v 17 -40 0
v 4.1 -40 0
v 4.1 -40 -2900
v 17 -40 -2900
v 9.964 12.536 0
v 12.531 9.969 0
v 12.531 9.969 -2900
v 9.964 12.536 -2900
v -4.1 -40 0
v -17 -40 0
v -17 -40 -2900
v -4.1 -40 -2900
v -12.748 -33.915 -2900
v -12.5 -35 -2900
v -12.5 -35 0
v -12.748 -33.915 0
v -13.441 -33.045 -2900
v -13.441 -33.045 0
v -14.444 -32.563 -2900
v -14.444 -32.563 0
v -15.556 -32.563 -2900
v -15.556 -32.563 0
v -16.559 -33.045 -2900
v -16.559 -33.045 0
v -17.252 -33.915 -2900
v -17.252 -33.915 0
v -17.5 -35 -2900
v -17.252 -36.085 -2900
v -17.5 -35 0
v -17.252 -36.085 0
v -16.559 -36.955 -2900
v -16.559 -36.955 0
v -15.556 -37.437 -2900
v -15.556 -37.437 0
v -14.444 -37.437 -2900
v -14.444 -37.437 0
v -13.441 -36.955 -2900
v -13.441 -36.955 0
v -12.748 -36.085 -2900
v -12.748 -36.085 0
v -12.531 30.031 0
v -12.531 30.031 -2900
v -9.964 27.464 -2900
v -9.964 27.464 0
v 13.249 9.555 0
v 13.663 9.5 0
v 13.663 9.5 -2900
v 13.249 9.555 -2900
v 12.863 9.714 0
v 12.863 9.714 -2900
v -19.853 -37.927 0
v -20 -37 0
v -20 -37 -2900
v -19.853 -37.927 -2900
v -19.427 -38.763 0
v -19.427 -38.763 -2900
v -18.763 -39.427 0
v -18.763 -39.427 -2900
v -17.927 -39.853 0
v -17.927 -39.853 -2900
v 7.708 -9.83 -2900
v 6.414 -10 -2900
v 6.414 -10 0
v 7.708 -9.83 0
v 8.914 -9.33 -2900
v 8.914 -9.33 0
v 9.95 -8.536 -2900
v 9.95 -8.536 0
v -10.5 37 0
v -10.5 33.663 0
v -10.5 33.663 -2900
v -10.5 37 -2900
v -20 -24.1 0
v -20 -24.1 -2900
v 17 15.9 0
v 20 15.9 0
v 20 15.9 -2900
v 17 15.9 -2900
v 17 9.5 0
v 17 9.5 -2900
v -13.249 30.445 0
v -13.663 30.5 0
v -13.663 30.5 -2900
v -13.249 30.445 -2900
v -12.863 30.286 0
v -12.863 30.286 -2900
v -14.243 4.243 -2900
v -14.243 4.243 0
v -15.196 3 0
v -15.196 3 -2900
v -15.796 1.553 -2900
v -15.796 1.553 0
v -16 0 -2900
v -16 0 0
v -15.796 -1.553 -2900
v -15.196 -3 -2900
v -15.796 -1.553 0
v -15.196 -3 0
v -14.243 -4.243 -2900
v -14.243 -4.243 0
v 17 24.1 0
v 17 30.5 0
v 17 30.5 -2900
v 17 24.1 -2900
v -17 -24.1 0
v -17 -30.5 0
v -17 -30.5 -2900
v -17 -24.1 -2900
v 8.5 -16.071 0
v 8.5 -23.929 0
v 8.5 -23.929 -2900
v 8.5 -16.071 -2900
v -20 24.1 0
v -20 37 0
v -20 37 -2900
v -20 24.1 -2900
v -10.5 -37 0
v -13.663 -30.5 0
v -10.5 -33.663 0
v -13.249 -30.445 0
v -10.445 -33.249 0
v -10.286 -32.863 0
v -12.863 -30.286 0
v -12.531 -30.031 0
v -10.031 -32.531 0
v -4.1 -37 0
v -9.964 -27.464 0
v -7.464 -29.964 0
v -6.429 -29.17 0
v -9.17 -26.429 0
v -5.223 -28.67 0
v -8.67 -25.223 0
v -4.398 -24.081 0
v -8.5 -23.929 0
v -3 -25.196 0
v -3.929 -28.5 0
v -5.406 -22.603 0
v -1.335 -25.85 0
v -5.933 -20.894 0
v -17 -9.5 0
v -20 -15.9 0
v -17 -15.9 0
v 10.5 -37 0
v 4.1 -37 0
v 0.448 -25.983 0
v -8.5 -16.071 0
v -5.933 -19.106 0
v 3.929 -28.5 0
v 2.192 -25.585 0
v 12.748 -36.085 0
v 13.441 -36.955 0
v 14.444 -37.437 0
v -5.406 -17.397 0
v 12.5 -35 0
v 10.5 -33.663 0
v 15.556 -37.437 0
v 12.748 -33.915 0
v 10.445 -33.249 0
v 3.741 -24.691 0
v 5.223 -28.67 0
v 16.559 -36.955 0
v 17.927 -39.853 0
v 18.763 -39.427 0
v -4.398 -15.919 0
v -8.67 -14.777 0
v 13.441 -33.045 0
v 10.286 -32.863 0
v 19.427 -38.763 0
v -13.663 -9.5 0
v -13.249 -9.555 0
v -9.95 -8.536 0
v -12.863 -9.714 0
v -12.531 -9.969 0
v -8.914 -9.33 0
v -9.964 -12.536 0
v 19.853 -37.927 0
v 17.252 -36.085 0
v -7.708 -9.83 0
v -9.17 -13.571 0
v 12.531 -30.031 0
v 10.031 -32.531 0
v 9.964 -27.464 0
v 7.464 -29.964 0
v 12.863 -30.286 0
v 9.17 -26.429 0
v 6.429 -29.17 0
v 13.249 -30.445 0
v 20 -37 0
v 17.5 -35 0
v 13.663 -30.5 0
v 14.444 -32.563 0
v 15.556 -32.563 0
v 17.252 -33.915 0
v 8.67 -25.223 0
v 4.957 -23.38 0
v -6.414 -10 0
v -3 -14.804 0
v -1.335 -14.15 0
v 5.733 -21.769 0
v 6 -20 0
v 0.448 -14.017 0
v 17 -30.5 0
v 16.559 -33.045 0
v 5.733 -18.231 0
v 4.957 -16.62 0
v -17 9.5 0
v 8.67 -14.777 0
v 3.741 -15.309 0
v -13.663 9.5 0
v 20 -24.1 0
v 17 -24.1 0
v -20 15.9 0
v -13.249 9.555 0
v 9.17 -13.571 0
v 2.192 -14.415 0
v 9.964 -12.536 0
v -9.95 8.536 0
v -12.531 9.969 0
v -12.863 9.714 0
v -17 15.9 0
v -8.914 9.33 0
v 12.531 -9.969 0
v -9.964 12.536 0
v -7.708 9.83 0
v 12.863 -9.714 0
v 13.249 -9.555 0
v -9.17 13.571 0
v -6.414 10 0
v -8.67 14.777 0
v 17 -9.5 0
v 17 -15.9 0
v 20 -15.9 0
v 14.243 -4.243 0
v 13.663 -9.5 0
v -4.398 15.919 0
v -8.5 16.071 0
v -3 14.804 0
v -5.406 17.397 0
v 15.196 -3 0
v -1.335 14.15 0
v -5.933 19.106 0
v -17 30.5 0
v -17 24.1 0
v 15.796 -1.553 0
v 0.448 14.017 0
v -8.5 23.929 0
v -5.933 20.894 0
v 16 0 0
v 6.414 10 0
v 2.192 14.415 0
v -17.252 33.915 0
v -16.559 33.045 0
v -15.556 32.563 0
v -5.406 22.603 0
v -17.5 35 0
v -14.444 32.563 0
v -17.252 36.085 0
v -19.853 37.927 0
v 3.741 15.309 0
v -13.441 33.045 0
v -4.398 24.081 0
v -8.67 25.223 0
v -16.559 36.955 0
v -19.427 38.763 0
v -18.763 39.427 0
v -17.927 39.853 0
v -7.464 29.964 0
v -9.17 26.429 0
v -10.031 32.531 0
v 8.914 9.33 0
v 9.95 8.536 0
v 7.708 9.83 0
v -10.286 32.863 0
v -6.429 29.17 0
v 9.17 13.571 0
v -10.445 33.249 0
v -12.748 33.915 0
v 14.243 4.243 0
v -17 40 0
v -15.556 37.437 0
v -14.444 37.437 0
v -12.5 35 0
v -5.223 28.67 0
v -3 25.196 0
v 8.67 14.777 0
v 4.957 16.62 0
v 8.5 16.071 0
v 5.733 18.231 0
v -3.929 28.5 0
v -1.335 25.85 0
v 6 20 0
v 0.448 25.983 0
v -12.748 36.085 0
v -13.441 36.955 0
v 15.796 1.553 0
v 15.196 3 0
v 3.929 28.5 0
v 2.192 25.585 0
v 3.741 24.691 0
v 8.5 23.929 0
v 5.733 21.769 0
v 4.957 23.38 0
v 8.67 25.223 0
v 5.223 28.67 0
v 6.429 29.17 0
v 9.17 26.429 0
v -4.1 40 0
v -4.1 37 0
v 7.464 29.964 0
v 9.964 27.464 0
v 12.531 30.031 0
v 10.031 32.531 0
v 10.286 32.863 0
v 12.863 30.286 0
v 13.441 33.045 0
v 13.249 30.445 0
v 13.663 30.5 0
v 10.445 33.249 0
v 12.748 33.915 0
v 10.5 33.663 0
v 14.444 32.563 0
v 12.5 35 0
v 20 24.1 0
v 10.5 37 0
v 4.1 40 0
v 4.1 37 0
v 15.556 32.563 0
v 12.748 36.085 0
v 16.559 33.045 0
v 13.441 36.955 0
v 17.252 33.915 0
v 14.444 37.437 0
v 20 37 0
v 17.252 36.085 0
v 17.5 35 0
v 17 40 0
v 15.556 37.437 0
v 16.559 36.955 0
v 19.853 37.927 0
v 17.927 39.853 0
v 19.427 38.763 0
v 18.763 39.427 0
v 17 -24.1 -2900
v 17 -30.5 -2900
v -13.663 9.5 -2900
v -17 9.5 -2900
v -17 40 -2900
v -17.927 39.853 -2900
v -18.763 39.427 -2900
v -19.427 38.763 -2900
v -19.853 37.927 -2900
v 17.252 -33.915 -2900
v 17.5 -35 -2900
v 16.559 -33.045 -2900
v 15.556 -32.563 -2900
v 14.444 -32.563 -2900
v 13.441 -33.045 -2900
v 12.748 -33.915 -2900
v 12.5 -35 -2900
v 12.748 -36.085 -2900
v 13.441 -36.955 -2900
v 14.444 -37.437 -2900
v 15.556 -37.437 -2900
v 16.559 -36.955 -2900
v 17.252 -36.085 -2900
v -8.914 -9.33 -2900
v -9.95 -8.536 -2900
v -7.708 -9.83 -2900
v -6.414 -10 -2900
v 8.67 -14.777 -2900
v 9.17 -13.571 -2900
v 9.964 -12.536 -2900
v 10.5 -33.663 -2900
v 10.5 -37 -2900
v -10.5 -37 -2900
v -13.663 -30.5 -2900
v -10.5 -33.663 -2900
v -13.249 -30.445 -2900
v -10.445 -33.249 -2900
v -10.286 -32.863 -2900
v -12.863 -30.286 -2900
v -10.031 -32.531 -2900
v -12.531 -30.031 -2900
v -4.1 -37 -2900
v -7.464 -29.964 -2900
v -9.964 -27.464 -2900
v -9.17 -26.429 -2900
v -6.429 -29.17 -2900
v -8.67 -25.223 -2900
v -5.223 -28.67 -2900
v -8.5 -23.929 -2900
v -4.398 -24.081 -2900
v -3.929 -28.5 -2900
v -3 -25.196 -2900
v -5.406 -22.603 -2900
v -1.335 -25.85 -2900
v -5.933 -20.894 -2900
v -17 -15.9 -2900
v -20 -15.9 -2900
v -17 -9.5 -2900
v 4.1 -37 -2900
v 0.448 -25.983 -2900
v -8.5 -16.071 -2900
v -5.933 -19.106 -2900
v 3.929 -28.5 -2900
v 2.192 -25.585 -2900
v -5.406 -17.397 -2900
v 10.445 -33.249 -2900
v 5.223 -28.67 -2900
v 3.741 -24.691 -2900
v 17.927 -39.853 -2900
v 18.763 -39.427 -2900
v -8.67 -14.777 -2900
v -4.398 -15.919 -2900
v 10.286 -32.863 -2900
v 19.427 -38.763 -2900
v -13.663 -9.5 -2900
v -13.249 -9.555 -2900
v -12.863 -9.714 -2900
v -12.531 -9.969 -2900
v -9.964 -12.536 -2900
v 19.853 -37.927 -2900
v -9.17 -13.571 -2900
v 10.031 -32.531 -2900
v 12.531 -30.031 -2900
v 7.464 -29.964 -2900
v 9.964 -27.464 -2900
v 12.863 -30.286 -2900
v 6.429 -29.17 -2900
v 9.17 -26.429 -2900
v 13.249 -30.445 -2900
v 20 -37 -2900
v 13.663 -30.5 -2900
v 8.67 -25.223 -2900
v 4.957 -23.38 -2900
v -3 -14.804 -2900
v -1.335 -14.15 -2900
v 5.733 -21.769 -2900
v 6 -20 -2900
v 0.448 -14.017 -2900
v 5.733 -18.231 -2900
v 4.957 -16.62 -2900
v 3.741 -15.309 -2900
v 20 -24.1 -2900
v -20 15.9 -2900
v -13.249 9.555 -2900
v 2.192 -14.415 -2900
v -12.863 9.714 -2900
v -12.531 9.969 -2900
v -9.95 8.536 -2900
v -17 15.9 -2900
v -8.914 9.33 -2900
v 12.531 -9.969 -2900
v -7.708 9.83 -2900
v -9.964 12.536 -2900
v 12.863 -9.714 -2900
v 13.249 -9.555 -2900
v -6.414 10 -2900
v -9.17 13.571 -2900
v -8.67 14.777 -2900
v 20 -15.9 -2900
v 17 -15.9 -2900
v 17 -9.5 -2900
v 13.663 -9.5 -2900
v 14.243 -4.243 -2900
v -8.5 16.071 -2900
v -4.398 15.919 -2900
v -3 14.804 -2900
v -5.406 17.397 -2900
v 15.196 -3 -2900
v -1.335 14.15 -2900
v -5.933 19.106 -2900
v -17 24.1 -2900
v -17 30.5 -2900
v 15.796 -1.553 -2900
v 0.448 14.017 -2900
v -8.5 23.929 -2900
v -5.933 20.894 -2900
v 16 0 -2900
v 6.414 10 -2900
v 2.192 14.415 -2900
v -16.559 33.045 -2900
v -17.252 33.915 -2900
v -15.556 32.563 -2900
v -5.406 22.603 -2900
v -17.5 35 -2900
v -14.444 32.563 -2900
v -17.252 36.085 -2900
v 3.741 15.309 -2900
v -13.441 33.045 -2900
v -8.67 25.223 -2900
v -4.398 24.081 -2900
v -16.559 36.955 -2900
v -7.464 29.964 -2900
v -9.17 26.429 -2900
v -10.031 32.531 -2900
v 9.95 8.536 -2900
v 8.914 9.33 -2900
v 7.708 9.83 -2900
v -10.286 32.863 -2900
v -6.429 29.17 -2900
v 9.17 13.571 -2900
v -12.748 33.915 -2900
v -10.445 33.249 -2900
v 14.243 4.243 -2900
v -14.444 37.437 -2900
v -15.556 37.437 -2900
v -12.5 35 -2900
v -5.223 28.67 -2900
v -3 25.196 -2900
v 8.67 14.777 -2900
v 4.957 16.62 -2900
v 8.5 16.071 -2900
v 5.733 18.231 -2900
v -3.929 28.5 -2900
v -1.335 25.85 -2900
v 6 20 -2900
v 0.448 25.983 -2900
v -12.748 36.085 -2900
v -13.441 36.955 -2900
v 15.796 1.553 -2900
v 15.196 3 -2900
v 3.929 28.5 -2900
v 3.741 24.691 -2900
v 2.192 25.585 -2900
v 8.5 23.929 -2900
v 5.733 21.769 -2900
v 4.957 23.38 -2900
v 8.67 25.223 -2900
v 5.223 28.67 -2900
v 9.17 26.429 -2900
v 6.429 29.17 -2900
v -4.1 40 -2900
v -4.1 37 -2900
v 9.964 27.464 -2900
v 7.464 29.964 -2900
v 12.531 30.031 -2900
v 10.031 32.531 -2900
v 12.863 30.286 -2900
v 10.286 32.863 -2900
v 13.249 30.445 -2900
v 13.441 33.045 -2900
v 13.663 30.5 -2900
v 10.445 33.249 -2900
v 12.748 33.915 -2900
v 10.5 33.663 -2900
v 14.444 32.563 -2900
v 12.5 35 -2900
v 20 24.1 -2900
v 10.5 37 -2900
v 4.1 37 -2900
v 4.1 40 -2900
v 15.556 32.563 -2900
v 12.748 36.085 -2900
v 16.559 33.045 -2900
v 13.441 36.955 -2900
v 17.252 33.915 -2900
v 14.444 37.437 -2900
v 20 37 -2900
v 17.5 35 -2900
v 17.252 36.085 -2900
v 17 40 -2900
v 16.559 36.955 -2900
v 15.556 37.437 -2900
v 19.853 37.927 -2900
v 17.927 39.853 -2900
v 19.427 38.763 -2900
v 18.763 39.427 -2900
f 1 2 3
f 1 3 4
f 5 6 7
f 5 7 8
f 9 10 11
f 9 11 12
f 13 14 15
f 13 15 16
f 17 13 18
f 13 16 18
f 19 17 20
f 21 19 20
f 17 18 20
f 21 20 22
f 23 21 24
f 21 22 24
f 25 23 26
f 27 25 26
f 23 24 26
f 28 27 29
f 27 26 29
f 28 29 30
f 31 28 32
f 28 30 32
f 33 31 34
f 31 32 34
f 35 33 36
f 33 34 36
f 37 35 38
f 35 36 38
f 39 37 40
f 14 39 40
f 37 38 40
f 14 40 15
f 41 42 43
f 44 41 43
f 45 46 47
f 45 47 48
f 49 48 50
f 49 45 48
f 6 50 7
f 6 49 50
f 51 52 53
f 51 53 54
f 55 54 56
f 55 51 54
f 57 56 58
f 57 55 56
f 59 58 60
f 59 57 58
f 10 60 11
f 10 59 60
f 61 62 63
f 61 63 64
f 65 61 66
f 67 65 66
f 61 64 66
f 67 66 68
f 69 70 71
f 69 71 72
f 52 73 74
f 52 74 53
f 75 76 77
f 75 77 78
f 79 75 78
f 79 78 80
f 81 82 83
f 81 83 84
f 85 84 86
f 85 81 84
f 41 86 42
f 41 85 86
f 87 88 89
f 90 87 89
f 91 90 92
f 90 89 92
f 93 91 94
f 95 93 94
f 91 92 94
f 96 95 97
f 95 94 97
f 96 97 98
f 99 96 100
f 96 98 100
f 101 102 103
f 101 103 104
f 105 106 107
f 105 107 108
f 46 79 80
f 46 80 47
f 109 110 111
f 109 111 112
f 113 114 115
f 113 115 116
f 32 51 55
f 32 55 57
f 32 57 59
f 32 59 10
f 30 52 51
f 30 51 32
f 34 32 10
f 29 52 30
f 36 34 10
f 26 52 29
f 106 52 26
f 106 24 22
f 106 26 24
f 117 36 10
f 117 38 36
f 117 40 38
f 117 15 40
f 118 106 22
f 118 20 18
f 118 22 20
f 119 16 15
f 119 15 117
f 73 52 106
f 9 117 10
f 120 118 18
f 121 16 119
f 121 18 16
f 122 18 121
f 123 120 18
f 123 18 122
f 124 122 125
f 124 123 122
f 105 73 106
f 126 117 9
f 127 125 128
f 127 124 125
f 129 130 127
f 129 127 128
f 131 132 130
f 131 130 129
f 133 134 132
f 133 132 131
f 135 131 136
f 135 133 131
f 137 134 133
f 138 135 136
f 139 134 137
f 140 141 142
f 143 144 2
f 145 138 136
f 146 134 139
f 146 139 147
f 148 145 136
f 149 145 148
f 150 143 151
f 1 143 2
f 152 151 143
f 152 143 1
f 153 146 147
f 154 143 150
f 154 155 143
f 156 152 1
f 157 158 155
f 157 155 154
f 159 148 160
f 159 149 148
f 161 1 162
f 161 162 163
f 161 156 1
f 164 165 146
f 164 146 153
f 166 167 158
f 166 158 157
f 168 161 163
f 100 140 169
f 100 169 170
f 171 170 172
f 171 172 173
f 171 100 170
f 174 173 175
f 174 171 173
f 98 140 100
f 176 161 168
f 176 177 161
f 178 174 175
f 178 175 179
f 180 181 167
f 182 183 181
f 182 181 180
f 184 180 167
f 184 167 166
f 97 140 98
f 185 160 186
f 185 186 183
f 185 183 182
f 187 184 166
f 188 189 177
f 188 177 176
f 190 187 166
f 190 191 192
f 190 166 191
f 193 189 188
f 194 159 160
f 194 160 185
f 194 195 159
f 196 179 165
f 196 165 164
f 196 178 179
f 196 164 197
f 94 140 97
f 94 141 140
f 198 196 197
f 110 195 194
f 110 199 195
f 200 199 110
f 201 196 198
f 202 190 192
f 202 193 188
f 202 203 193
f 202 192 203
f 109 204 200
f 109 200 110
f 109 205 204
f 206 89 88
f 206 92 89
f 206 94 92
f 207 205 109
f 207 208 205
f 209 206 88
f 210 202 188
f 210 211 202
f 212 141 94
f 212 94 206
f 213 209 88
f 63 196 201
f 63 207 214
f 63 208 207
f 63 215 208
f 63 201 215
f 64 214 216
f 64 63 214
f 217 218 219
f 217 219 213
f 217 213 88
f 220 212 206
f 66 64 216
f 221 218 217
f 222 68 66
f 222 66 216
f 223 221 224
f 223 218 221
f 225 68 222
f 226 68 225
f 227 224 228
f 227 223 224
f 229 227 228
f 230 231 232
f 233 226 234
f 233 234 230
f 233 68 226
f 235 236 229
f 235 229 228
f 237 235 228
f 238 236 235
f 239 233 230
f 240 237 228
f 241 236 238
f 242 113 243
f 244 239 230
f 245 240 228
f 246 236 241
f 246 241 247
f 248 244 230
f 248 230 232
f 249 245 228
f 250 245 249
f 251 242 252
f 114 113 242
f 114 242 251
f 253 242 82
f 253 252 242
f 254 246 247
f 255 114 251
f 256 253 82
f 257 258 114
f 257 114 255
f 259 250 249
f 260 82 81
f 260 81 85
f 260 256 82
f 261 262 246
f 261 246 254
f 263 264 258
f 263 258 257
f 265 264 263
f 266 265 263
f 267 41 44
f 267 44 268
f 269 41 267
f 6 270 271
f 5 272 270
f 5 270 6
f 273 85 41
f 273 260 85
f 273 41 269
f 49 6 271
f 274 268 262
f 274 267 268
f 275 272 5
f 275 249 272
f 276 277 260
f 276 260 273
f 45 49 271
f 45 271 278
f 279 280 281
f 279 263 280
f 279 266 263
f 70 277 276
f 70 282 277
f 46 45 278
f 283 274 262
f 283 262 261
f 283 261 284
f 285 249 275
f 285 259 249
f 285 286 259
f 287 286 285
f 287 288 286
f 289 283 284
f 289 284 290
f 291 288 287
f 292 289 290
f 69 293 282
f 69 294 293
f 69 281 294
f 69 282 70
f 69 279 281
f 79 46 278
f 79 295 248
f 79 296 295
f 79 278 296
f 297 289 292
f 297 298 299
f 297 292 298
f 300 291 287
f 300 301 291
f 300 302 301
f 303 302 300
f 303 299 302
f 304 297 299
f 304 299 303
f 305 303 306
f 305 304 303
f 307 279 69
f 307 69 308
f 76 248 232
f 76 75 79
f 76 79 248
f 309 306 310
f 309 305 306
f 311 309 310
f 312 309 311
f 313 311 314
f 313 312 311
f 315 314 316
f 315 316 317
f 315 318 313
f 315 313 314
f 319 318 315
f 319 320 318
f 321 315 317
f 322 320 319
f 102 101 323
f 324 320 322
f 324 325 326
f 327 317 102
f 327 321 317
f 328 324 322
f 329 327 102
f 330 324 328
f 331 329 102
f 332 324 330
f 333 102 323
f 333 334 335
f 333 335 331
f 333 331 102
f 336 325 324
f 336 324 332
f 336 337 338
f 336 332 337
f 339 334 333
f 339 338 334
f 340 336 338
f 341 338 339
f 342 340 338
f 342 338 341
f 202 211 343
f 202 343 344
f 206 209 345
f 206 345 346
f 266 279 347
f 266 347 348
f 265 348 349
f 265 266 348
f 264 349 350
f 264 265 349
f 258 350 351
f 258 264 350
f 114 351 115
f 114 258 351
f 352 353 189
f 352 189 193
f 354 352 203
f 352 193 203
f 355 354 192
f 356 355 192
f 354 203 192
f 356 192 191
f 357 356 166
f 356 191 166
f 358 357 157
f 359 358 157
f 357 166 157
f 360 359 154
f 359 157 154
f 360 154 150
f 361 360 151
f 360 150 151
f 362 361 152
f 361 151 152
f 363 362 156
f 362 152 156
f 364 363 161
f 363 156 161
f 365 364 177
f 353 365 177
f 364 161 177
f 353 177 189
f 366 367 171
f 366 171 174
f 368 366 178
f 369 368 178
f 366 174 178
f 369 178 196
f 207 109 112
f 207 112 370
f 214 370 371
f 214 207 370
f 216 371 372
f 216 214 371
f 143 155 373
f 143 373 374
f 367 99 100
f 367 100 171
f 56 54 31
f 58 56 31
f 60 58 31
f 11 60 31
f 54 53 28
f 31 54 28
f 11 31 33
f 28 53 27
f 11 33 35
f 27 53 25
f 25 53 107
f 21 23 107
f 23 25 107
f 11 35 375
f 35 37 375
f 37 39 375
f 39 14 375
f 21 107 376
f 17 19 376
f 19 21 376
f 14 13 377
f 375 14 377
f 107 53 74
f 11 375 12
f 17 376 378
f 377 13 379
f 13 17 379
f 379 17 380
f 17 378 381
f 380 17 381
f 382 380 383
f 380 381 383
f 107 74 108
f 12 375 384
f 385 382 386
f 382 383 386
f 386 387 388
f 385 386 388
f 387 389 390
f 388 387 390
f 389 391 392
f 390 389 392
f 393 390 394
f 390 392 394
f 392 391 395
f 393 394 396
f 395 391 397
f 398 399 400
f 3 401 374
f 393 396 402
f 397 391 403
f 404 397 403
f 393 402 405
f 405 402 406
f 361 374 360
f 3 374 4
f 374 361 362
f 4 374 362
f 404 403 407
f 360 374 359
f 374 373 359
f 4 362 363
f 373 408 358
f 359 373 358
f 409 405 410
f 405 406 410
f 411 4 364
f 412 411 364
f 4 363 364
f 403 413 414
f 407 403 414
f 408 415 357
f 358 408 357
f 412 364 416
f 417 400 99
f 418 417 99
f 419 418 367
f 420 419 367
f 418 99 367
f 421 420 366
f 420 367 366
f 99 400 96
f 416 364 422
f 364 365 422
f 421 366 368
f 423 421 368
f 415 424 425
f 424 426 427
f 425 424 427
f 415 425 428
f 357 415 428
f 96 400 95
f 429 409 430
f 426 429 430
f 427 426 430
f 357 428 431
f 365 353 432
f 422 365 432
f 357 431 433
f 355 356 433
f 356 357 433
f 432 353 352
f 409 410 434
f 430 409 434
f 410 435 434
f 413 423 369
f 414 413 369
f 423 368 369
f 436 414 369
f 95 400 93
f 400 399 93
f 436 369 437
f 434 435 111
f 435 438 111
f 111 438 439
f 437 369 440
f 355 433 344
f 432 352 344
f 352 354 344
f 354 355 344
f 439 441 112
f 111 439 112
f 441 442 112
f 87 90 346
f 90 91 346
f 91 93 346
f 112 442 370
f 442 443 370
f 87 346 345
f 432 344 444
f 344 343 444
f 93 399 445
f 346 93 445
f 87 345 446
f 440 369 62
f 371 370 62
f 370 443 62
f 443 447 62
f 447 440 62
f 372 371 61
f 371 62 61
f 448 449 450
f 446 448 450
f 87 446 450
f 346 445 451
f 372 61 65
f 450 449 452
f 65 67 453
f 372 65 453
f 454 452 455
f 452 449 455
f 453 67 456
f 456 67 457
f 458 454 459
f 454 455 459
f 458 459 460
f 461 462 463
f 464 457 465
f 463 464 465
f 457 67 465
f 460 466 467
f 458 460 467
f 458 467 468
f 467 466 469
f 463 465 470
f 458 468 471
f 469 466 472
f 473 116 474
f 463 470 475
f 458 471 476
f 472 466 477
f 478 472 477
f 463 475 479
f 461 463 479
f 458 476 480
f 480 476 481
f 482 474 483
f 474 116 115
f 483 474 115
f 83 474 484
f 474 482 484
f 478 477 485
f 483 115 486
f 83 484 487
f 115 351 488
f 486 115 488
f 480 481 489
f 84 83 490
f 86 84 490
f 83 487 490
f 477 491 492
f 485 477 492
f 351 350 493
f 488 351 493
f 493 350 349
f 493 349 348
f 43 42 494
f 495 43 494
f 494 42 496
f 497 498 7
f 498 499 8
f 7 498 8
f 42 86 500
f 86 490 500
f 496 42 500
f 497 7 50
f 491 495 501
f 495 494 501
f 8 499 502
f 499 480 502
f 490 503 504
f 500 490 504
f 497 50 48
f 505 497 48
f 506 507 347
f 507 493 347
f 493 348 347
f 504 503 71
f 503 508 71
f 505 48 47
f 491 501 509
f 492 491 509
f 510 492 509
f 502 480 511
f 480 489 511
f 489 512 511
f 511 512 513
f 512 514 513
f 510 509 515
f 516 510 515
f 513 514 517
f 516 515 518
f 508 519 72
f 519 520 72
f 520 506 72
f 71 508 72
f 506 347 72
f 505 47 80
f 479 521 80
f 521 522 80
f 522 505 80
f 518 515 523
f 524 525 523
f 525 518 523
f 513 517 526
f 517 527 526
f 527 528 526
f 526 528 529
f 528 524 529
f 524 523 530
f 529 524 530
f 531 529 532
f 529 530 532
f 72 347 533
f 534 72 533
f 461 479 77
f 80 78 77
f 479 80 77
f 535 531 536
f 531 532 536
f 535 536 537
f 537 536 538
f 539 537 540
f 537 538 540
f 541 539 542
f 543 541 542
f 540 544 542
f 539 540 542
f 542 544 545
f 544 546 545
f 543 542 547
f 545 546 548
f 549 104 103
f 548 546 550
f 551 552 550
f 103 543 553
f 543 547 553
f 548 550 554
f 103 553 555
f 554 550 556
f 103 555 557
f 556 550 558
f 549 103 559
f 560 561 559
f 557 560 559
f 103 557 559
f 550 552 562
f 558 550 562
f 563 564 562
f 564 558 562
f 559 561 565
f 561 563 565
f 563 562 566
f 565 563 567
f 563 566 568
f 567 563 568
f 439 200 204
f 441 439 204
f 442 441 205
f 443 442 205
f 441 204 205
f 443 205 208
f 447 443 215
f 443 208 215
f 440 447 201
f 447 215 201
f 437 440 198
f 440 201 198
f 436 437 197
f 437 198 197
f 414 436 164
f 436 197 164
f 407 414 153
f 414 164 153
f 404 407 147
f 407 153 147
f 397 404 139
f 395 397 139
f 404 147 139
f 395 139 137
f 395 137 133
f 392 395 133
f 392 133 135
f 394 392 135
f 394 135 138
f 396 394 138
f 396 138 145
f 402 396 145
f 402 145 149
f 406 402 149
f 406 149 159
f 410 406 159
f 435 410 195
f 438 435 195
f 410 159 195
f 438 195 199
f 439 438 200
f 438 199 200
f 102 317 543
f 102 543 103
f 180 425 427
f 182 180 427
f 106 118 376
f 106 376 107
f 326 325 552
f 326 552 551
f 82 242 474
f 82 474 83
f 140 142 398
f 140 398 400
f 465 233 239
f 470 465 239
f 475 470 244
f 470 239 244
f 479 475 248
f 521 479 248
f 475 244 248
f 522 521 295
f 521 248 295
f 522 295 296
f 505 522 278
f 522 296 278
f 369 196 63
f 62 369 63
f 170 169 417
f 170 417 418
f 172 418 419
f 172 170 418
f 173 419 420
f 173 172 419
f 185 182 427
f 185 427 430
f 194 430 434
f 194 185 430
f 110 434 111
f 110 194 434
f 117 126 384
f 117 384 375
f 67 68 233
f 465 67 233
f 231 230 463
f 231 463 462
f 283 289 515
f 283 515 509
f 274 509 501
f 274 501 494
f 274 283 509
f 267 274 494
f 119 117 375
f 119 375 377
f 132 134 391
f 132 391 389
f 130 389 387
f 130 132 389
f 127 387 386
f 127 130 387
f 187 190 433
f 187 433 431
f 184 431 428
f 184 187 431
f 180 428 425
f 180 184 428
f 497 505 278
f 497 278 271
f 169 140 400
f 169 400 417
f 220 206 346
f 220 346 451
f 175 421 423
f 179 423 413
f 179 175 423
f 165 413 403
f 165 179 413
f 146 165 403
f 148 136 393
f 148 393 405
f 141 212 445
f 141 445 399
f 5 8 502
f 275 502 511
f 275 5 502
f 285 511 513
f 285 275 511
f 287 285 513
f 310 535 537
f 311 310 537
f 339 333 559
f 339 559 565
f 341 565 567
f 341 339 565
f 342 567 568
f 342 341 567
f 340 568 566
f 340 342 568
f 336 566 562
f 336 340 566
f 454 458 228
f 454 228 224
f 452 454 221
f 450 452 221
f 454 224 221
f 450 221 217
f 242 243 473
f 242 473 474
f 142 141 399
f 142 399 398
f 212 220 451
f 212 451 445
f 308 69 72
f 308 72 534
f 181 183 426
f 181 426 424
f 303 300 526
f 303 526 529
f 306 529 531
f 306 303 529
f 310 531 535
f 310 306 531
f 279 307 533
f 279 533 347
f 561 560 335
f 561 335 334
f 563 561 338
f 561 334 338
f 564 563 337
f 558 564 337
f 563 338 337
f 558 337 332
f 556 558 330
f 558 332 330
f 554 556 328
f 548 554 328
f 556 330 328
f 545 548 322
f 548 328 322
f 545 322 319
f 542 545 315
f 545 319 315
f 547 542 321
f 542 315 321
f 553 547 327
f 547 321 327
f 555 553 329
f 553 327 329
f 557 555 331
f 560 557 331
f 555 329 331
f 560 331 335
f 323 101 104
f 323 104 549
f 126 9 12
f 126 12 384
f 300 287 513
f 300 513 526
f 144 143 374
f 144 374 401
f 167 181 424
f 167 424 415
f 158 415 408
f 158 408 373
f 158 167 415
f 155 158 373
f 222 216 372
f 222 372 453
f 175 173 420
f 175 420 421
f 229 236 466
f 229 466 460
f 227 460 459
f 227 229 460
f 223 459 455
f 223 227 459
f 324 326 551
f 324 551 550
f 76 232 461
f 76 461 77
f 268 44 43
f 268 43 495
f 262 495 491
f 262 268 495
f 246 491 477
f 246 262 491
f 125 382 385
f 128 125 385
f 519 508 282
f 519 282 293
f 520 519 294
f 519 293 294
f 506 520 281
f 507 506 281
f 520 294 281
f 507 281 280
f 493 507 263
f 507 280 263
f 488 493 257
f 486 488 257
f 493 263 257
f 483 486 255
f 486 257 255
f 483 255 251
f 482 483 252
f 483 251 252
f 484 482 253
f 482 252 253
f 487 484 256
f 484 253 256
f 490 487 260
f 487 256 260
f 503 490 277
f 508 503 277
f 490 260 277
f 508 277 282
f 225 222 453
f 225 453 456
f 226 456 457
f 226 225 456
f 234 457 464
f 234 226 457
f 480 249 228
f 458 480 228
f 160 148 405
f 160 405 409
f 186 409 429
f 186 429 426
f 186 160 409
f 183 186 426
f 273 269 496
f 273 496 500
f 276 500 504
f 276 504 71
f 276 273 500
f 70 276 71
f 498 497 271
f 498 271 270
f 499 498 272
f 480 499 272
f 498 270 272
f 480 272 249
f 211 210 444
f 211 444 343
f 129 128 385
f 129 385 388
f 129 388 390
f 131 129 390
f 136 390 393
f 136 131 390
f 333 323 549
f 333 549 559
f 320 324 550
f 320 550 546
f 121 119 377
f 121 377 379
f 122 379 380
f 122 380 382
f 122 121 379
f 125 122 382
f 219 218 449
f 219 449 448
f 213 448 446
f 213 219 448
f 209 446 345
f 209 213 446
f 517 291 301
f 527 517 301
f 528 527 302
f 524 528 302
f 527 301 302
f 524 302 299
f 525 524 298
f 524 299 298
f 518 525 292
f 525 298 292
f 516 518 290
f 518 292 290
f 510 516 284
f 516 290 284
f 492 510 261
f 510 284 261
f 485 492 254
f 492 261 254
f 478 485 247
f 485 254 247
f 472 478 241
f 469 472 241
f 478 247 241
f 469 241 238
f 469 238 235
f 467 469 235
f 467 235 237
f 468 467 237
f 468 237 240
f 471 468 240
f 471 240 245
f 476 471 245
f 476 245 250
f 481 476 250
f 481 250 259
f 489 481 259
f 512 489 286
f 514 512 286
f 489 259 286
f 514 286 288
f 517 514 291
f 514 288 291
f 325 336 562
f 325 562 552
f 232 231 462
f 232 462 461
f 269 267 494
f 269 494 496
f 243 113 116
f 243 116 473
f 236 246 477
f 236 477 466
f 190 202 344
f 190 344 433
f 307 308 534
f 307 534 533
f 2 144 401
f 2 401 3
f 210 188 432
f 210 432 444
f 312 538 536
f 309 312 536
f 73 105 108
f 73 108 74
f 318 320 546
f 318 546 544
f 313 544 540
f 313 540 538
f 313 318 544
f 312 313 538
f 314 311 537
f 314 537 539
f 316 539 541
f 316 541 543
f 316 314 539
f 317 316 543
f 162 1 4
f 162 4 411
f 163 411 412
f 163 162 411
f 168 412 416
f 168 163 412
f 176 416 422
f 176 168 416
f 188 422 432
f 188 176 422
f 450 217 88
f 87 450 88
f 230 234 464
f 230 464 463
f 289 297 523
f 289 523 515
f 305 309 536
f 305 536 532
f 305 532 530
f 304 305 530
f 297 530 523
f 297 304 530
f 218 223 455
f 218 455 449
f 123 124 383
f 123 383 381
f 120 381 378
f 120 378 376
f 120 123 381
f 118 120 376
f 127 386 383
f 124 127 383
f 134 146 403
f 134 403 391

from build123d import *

# Parameters (mm, degrees)
SKETCH1_R           = 2.5
SKETCH1_R_2         = 6
BOSS_EXTRUDE1_DEPTH = 2900


with BuildPart() as part:
    # Sketch1 → Boss-Extrude1 (new body)
    with BuildSketch(Plane.XY):
        with BuildLine():
            Line((-17, -40), (-4.1, -40))
            Line((-4.1, -40), (-4.1, -37))
            Line((-4.1, -37), (-10.5, -37))
            Line((-10.5, -37), (-10.5, -33.6627417))
            ThreePointArc((-10.5, -33.6627417), (-10.378207252, -33.050448208), (-10.03137085, -32.53137085))
            Line((-10.03137085, -32.53137085), (-7.464466094, -29.964466094))
            ThreePointArc((-7.464466094, -29.964466094), (-5.84234935, -28.880602337), (-3.928932188, -28.5))
            Line((-3.928932188, -28.5), (3.928932188, -28.5))
            ThreePointArc((3.928932188, -28.5), (5.84234935, -28.880602337), (7.464466094, -29.964466094))
            Line((7.464466094, -29.964466094), (10.03137085, -32.53137085))
            ThreePointArc((10.03137085, -32.53137085), (10.378207252, -33.050448208), (10.5, -33.6627417))
            Line((10.5, -33.6627417), (10.5, -37))
            Line((10.5, -37), (4.1, -37))
            Line((4.1, -37), (4.1, -40))
            Line((4.1, -40), (17, -40))
            ThreePointArc((17, -40), (19.121320344, -39.121320344), (20, -37))
            Line((20, -37), (20, -24.1))
            Line((20, -24.1), (17, -24.1))
            Line((17, -24.1), (17, -30.5))
            Line((17, -30.5), (13.6627417, -30.5))
            ThreePointArc((13.6627417, -30.5), (13.050448208, -30.378207252), (12.53137085, -30.03137085))
            Line((12.53137085, -30.03137085), (9.964466094, -27.464466094))
            ThreePointArc((9.964466094, -27.464466094), (8.880602337, -25.84234935), (8.5, -23.928932188))
            Line((8.5, -23.928932188), (8.5, -16.071067812))
            ThreePointArc((8.5, -16.071067812), (8.880602337, -14.15765065), (9.964466094, -12.535533906))
            Line((9.964466094, -12.535533906), (12.53137085, -9.96862915))
            ThreePointArc((12.53137085, -9.96862915), (13.050448208, -9.621792748), (13.6627417, -9.5))
            Line((13.6627417, -9.5), (17, -9.5))
            Line((17, -9.5), (17, -15.9))
            Line((17, -15.9), (20, -15.9))
            Line((20, -15.9), (20, 15.9))
            Line((20, 15.9), (17, 15.9))
            Line((17, 15.9), (17, 9.5))
            Line((17, 9.5), (13.6627417, 9.5))
            ThreePointArc((13.6627417, 9.5), (13.050448208, 9.621792748), (12.53137085, 9.96862915))
            Line((12.53137085, 9.96862915), (9.964466094, 12.535533906))
            ThreePointArc((9.964466094, 12.535533906), (8.880602337, 14.15765065), (8.5, 16.071067812))
            Line((8.5, 16.071067812), (8.5, 23.928932188))
            ThreePointArc((8.5, 23.928932188), (8.880602337, 25.84234935), (9.964466094, 27.464466094))
            Line((9.964466094, 27.464466094), (12.53137085, 30.03137085))
            ThreePointArc((12.53137085, 30.03137085), (13.050448208, 30.378207252), (13.6627417, 30.5))
            Line((13.6627417, 30.5), (17, 30.5))
            Line((17, 30.5), (17, 24.1))
            Line((17, 24.1), (20, 24.1))
            Line((20, 24.1), (20, 37))
            ThreePointArc((20, 37), (19.121320344, 39.121320344), (17, 40))
            Line((17, 40), (4.1, 40))
            Line((4.1, 40), (4.1, 37))
            Line((4.1, 37), (10.5, 37))
            Line((10.5, 37), (10.5, 33.6627417))
            ThreePointArc((10.5, 33.6627417), (10.378207252, 33.050448208), (10.03137085, 32.53137085))
            Line((10.03137085, 32.53137085), (7.464466094, 29.964466094))
            ThreePointArc((7.464466094, 29.964466094), (5.84234935, 28.880602337), (3.928932188, 28.5))
            Line((3.928932188, 28.5), (-3.928932188, 28.5))
            ThreePointArc((-3.928932188, 28.5), (-5.84234935, 28.880602337), (-7.464466094, 29.964466094))
            Line((-7.464466094, 29.964466094), (-10.03137085, 32.53137085))
            ThreePointArc((-10.03137085, 32.53137085), (-10.378207252, 33.050448208), (-10.5, 33.6627417))
            Line((-10.5, 33.6627417), (-10.5, 37))
            Line((-10.5, 37), (-4.1, 37))
            Line((-4.1, 37), (-4.1, 40))
            Line((-4.1, 40), (-17, 40))
            ThreePointArc((-17, 40), (-19.121320344, 39.121320344), (-20, 37))
            Line((-20, 37), (-20, 24.1))
            Line((-20, 24.1), (-17, 24.1))
            Line((-17, 24.1), (-17, 30.5))
            Line((-17, 30.5), (-13.6627417, 30.5))
            ThreePointArc((-13.6627417, 30.5), (-13.050448208, 30.378207252), (-12.53137085, 30.03137085))
            Line((-12.53137085, 30.03137085), (-9.964466094, 27.464466094))
            ThreePointArc((-9.964466094, 27.464466094), (-8.880602337, 25.84234935), (-8.5, 23.928932188))
            Line((-8.5, 23.928932188), (-8.5, 16.071067812))
            ThreePointArc((-8.5, 16.071067812), (-8.880602337, 14.15765065), (-9.964466094, 12.535533906))
            Line((-9.964466094, 12.535533906), (-12.53137085, 9.96862915))
            ThreePointArc((-12.53137085, 9.96862915), (-13.050448208, 9.621792748), (-13.6627417, 9.5))
            Line((-13.6627417, 9.5), (-17, 9.5))
            Line((-17, 9.5), (-17, 15.9))
            Line((-17, 15.9), (-20, 15.9))
            Line((-20, 15.9), (-20, -15.9))
            Line((-20, -15.9), (-17, -15.9))
            Line((-17, -15.9), (-17, -9.5))
            Line((-17, -9.5), (-13.6627417, -9.5))
            ThreePointArc((-13.6627417, -9.5), (-13.050448208, -9.621792748), (-12.53137085, -9.96862915))
            Line((-12.53137085, -9.96862915), (-9.964466094, -12.535533906))
            ThreePointArc((-9.964466094, -12.535533906), (-8.880602337, -14.15765065), (-8.5, -16.071067812))
            Line((-8.5, -16.071067812), (-8.5, -23.928932188))
            ThreePointArc((-8.5, -23.928932188), (-8.880602337, -25.84234935), (-9.964466094, -27.464466094))
            Line((-9.964466094, -27.464466094), (-12.53137085, -30.03137085))
            ThreePointArc((-12.53137085, -30.03137085), (-13.050448208, -30.378207252), (-13.6627417, -30.5))
            Line((-13.6627417, -30.5), (-17, -30.5))
            Line((-17, -30.5), (-17, -24.1))
            Line((-17, -24.1), (-20, -24.1))
            Line((-20, -24.1), (-20, -37))
            ThreePointArc((-20, -37), (-19.121320344, -39.121320344), (-17, -40))
        make_face()
        with Locations((15, 35)):
            Circle(SKETCH1_R, mode=Mode.SUBTRACT)
        with Locations((15, -35)):
            Circle(SKETCH1_R, mode=Mode.SUBTRACT)
        with Locations((0, 20)):
            Circle(SKETCH1_R_2, mode=Mode.SUBTRACT)
        with Locations((0, -20)):
            Circle(SKETCH1_R_2, mode=Mode.SUBTRACT)
        with Locations((-15, 35)):
            Circle(SKETCH1_R, mode=Mode.SUBTRACT)
        with Locations((-15, -35)):
            Circle(SKETCH1_R, mode=Mode.SUBTRACT)
        with BuildLine():
            Line((-14.242640687, -4.242640687), (-9.949747468, -8.535533906))
            ThreePointArc((-9.949747468, -8.535533906), (-8.327630724, -9.619397663), (-6.414213562, -10))
            Line((-6.414213562, -10), (6.414213562, -10))
            ThreePointArc((6.414213562, -10), (8.327630724, -9.619397663), (9.949747468, -8.535533906))
            Line((9.949747468, -8.535533906), (14.242640687, -4.242640687))
            ThreePointArc((14.242640687, -4.242640687), (16, 0), (14.242640687, 4.242640687))
            Line((14.242640687, 4.242640687), (9.949747468, 8.535533906))
            ThreePointArc((9.949747468, 8.535533906), (8.327630724, 9.619397663), (6.414213562, 10))
            Line((6.414213562, 10), (-6.414213562, 10))
            ThreePointArc((-6.414213562, 10), (-8.327630724, 9.619397663), (-9.949747468, 8.535533906))
            Line((-9.949747468, 8.535533906), (-14.242640687, 4.242640687))
            ThreePointArc((-14.242640687, 4.242640687), (-16, 0), (-14.242640687, -4.242640687))
        make_face(mode=Mode.SUBTRACT)
    extrude(amount=-BOSS_EXTRUDE1_DEPTH)


solid = part.part
